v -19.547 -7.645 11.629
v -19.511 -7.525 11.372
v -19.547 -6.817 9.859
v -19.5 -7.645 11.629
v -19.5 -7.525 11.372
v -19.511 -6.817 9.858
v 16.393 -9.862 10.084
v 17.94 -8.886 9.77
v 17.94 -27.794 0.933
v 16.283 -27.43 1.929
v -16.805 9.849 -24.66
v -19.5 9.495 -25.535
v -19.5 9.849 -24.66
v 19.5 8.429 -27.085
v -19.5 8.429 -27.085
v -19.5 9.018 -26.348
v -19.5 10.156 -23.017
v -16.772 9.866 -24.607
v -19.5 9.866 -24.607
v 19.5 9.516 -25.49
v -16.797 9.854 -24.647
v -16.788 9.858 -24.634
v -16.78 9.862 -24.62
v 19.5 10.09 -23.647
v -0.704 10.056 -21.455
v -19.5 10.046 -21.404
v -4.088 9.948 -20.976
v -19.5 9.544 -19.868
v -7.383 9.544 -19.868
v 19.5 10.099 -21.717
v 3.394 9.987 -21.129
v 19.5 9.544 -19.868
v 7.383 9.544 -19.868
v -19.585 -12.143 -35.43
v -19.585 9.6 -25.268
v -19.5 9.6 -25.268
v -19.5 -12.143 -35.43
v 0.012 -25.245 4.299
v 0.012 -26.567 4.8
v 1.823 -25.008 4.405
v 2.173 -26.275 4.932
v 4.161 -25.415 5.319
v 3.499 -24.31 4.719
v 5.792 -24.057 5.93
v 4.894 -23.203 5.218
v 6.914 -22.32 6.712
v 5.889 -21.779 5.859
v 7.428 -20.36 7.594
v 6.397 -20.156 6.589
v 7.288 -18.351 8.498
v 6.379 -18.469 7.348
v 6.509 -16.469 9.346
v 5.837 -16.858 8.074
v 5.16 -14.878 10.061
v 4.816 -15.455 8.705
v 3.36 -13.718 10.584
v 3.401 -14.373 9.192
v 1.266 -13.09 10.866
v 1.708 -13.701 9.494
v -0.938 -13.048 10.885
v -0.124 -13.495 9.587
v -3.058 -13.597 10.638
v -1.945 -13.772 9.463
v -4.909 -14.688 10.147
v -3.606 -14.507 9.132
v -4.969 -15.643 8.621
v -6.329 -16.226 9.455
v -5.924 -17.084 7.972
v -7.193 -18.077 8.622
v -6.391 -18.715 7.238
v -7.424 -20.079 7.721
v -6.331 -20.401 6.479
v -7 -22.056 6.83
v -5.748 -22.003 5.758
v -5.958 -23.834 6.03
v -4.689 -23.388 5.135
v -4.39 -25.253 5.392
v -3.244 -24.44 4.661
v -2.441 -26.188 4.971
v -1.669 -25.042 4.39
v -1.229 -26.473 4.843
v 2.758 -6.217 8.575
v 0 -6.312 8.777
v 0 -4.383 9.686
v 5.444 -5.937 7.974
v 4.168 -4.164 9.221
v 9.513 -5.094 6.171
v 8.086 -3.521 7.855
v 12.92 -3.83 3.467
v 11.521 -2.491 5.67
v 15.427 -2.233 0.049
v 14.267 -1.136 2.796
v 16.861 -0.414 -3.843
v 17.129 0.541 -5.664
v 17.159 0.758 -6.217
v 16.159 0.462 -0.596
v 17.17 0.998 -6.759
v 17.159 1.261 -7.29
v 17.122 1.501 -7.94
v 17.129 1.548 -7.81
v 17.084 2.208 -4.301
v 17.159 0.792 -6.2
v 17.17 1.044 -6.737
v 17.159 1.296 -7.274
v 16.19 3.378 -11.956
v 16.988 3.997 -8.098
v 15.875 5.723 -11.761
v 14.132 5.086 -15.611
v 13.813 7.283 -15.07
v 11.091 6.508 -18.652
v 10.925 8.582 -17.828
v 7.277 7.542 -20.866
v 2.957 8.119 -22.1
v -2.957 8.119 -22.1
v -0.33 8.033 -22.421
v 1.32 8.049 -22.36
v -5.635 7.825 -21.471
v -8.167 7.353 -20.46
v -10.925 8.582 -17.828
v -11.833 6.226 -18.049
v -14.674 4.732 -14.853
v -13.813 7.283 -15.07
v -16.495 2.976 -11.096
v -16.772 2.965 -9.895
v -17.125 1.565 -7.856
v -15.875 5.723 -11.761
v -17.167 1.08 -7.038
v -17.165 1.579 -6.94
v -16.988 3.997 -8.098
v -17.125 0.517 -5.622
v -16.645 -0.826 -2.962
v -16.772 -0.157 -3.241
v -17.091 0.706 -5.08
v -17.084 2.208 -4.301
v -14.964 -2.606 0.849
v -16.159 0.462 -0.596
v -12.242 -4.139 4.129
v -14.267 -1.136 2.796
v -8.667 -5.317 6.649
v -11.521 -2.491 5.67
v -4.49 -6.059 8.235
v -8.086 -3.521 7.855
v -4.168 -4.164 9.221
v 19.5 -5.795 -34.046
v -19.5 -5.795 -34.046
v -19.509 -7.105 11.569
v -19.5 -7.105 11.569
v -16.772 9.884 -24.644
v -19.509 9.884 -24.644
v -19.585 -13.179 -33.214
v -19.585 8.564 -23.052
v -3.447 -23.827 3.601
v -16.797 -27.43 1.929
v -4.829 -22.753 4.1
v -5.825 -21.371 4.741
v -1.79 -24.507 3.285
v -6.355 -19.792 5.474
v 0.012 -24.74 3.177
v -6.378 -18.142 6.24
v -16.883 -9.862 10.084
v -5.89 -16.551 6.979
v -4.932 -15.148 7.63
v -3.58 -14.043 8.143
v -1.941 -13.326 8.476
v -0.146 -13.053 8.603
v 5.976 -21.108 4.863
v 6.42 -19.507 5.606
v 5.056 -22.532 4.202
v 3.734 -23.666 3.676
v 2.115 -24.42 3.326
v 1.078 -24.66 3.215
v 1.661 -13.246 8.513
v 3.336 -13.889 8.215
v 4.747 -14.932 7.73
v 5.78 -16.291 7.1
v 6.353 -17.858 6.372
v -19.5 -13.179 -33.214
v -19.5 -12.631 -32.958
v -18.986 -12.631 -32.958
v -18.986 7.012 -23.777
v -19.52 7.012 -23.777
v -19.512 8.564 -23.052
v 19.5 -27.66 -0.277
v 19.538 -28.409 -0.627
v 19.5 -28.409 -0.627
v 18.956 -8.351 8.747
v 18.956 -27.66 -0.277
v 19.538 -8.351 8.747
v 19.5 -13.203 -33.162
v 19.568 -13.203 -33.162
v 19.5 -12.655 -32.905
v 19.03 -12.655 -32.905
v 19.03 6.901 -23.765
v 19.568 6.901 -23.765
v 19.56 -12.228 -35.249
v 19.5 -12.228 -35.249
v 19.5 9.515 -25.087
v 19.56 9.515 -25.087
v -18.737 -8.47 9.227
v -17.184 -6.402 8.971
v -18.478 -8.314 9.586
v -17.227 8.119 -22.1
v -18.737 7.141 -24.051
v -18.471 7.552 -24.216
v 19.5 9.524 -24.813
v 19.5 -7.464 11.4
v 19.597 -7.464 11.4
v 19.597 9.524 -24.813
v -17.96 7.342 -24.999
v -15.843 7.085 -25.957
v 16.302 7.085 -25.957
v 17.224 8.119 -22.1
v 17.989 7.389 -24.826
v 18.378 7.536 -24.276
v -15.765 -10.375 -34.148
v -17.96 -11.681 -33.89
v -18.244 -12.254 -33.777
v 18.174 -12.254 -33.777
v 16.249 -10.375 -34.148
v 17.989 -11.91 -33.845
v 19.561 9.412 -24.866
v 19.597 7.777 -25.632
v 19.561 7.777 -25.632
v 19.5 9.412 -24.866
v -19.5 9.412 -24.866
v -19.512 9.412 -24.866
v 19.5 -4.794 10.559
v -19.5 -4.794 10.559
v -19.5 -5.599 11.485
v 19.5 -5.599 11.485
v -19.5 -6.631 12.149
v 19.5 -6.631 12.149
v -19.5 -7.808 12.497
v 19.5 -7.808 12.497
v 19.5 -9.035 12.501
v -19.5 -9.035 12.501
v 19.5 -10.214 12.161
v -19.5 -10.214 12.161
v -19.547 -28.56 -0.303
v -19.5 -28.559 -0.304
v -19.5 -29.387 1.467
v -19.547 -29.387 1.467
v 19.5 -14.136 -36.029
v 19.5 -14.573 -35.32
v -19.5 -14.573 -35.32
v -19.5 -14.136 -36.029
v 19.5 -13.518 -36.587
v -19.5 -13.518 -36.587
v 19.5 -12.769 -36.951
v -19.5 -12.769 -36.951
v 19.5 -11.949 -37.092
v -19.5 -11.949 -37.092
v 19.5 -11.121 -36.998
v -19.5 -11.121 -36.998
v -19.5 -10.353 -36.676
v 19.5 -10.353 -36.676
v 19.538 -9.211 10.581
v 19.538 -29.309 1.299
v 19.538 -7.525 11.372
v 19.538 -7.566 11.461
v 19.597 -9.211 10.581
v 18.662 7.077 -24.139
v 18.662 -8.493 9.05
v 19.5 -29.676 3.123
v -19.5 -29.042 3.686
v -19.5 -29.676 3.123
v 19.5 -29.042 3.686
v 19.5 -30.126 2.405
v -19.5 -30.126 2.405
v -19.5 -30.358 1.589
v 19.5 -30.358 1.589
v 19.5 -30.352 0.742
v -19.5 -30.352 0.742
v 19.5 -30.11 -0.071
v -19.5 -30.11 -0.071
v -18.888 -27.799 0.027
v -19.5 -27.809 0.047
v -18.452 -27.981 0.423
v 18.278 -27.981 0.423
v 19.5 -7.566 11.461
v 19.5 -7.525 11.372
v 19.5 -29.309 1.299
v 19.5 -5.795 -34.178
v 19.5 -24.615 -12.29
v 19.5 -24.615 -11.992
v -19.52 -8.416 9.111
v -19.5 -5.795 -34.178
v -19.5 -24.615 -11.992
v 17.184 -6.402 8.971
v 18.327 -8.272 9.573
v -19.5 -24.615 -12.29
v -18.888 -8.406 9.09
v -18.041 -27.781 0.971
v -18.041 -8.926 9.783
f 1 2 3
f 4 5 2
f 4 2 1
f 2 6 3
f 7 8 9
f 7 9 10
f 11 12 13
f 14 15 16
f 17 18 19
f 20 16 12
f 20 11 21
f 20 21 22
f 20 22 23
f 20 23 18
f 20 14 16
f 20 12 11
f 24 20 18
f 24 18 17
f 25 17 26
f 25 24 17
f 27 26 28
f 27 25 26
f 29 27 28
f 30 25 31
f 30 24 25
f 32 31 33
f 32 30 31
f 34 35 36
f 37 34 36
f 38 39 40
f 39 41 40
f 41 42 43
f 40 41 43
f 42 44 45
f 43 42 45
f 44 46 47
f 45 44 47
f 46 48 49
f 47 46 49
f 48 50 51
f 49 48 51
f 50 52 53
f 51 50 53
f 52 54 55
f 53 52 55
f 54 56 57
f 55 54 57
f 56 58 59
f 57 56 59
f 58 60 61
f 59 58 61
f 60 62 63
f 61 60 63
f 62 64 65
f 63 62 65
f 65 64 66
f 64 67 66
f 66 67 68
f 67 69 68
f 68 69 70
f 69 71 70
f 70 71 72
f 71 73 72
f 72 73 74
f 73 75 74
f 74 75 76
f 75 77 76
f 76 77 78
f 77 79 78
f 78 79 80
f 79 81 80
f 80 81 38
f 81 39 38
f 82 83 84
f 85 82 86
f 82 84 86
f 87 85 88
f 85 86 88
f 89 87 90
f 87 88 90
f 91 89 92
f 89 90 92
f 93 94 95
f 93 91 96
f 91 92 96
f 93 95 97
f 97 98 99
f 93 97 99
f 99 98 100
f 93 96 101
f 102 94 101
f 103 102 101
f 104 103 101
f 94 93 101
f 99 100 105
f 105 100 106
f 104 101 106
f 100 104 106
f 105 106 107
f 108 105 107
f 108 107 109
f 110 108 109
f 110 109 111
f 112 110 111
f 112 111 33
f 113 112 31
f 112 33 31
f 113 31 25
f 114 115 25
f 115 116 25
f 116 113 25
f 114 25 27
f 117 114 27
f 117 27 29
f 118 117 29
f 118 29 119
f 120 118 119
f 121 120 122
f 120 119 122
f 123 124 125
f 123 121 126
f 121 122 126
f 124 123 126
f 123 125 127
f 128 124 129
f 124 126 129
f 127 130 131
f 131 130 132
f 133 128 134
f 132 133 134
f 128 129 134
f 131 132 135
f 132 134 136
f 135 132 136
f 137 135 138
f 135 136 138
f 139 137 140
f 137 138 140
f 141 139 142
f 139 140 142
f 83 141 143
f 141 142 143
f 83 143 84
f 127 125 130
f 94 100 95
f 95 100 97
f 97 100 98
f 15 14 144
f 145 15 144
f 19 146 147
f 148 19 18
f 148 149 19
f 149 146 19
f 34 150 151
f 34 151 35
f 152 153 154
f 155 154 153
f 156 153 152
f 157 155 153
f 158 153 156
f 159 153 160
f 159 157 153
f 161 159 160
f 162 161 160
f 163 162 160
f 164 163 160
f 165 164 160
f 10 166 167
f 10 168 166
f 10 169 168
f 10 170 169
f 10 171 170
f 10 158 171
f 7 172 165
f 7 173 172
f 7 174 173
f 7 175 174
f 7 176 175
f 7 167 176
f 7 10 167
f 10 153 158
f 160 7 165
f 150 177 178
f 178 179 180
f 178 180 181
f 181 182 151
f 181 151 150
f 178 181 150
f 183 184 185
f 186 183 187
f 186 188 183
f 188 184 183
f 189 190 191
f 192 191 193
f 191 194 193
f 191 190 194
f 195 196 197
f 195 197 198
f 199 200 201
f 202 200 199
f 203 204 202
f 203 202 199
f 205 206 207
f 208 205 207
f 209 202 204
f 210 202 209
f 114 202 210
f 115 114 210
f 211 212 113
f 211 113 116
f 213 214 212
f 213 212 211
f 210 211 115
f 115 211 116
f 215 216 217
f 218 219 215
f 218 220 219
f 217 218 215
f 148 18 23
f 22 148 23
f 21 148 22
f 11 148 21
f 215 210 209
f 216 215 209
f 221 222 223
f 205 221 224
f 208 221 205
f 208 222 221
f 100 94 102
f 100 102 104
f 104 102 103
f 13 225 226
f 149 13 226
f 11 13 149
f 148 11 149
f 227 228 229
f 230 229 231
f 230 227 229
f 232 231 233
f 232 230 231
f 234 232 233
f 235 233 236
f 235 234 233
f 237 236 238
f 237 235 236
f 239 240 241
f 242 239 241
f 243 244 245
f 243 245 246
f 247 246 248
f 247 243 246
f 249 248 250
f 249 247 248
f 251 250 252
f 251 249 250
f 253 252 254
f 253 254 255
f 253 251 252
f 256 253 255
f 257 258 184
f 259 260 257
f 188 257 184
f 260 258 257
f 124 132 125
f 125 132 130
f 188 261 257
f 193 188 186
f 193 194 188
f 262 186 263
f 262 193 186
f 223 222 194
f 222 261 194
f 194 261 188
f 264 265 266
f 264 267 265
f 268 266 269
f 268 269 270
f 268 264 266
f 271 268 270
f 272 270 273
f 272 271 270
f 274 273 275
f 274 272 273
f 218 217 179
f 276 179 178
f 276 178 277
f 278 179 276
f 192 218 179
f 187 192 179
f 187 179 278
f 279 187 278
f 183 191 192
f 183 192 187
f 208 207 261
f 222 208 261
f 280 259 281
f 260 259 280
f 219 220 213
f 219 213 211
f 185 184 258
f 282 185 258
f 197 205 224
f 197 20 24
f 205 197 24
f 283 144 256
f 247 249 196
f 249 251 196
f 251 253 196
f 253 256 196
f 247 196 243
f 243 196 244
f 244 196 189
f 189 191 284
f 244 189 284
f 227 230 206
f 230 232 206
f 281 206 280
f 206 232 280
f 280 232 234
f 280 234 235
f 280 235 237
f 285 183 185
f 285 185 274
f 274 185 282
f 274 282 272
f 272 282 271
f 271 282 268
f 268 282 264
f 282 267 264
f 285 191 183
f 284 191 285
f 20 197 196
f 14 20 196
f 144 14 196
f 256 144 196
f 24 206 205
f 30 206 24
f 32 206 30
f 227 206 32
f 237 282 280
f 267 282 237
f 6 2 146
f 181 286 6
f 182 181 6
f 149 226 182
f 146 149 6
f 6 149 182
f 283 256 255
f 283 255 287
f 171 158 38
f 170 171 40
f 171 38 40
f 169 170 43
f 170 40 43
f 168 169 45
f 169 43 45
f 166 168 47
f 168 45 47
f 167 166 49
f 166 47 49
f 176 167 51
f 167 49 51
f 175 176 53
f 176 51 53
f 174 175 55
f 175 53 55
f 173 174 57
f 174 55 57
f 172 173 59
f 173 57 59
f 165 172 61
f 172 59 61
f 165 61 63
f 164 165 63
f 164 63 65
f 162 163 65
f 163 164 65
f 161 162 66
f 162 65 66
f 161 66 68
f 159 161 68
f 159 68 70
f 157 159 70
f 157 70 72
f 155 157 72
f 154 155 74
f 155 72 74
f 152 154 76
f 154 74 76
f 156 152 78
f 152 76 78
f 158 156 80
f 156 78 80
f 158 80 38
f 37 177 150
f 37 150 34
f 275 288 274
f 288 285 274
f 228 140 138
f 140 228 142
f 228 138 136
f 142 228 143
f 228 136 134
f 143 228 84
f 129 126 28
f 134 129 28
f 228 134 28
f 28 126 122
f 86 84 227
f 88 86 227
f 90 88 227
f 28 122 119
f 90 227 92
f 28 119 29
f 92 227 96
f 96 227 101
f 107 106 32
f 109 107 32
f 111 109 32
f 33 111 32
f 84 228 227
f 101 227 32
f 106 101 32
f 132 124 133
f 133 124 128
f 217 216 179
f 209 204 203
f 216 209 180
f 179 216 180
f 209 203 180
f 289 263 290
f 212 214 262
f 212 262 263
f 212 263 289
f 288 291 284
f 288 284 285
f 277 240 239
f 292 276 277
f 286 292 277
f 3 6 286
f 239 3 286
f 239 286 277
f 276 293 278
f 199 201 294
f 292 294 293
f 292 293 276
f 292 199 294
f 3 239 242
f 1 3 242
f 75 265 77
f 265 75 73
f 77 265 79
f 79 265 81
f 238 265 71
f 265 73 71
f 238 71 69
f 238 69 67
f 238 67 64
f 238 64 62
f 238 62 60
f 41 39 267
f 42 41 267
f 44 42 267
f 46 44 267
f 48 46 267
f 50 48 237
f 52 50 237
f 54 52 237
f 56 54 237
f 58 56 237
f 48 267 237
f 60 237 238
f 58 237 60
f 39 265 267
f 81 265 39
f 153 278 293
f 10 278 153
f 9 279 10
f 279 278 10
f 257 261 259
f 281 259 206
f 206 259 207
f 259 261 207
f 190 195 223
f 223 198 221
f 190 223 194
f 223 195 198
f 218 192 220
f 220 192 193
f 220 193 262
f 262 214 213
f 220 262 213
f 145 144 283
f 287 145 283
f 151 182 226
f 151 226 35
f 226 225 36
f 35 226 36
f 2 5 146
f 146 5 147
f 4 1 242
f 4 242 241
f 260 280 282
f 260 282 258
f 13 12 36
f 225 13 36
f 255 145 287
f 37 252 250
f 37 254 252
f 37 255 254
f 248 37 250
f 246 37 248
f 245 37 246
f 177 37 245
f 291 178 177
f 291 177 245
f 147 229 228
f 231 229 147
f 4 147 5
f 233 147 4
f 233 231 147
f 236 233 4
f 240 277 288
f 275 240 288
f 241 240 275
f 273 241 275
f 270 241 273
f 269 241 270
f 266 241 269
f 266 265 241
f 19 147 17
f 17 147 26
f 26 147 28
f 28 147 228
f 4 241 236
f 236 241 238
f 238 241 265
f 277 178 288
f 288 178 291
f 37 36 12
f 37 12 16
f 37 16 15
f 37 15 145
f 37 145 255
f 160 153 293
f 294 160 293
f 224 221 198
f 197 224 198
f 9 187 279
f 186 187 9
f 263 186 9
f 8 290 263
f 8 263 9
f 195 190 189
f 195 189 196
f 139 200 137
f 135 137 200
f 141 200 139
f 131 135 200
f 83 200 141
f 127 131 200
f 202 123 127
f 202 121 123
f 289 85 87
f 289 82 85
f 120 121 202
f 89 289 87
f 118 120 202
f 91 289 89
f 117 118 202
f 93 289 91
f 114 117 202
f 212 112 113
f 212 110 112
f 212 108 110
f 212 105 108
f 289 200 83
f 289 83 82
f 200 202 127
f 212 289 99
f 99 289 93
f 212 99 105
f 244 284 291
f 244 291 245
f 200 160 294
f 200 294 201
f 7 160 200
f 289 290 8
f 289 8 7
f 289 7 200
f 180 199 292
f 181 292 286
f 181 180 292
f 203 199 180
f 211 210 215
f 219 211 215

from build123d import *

# Parameters (mm, degrees)
PAD_DEPTH       = 19.5
POCKET_DEPTH    = 42
SKETCH003_R     = 6.4432774511
POCKET001_DEPTH = 5
SKETCH004_R     = 17.169517
POCKET002_DEPTH = 5
PAD001_DEPTH    = 40
PAD002_DEPTH    = 24
CHAMFER_SIZE    = 1


with BuildPart() as part:
    # Sketch → Pad (new body, symmetric)
    with BuildSketch(Plane.YZ):
        with BuildLine():
            Line((-24.615255, -40.645466), (-24.615255, -11.9915260199))
            Line((-24.615255, -11.9915260199), (-30.1099110656, -0.070655828))
            ThreePointArc((-29.0420891926, 3.6862219759), (-30.2710994658, 2.00535199), (-30.1099110656, -0.070655828))
            Line((-29.0420891926, 3.6862219759), (-10.21399901, 12.1607312799))
            ThreePointArc((-4.7944050935, 10.5585189909), (-7.2070537123, 12.364749952), (-10.21399901, 12.1607312799))
            Line((-4.7944050935, 10.5585189909), (9.5435566353, -19.8681705288))
            ThreePointArc((8.4289379194, -27.0849824103), (10.0898273983, -23.6470216852), (9.5435566353, -19.8681705288))
            Line((8.4289379194, -27.0849824103), (-5.794836, -34.045753))
            Line((-5.794836, -34.045753), (-5.794836, -40.645466))
            Line((-5.794836, -40.645466), (-24.615255, -40.645466))
        make_face()
        Polygon((-27.981411, 0.422502), (-27.429825, 1.92854), (-9.861721, 10.084236), (-6.402346, 8.970874), (8.119048, -22.100113), (7.085211, -25.957119), (-10.374684, -34.147896), (-12.253858, -33.776932), align=None, mode=Mode.SUBTRACT)
    extrude(amount=PAD_DEPTH, both=True)

    # Sketch002 (on Face20 of Pad) → Pocket (cut)
    with BuildSketch(Plane.YZ.offset(19.5)):
        with BuildLine():
            Line((-24.841486, -11.770947), (-14.572847112, -35.3198980182))
            ThreePointArc((-14.572847112, -35.3198980182), (-12.7694099446, -36.9511784812), (-10.3532255429, -36.6763794588))
            Line((-10.3532255429, -36.6763794588), (-4.861786, -33.667202))
            Line((-4.861786, -33.667202), (-4.861786, -40.862381))
            Line((-4.861786, -40.862381), (-24.841486, -40.862381))
            Line((-24.841486, -40.862381), (-24.841486, -11.770947))
        make_face()
    extrude(amount=-POCKET_DEPTH, mode=Mode.SUBTRACT)

    # Sketch003 (on Face13 of Pocket) → Pocket001 (cut)
    with BuildSketch(Plane(origin=(0, -6.272118922, 13.9349685583), x_dir=(0, -0.9118876327, -0.4104399412), z_dir=(0, -0.4104399412, 0.9118876327))):
        with Locations((14.81313, 0.011856)):
            Circle(SKETCH003_R)
    extrude(amount=-POCKET001_DEPTH, mode=Mode.SUBTRACT)

    # Sketch004 (on Face11 of Pocket001) → Pocket002 (cut)
    with BuildSketch(Plane(origin=(0, 0.1481790527, 0.06982638), x_dir=(0, -0.426272087, 0.9045949966), z_dir=(0, 0.9045949966, 0.426272087))):
        with Locations((-6.539624, 0)):
            Circle(SKETCH004_R)
    extrude(amount=-POCKET002_DEPTH, mode=Mode.SUBTRACT)

    # Sketch005 (on Face18 of Pocket002) → Pad001 (join)
    with BuildSketch(Plane(origin=(0, 11.2585506109, -23.9993240592), x_dir=(0, -0.9053303403, -0.4247081056), z_dir=(0, -0.4247081056, 0.9053303403))):
        Polygon((1.91594, 19.597263), (3.845239, 19.597263), (3.845239, 18.66189), (1.91594, 17.128572), align=None)
        Polygon((1.518515, -16.771593), (3.74988, -18.737337), (3.74988, -19.519863), (1.518515, -19.509285), align=None)
    extrude(amount=PAD001_DEPTH)

    # Sketch006 (on Face35 of Pad001) → Pad002 (join)
    with BuildSketch(Plane(origin=(0, -1.8135690856, -0.8475930049), x_dir=(0, 0.4234025651, -0.905941647), z_dir=(0, -0.905941647, -0.4234025651))):
        Polygon((-13.586584, 19.537718), (-11.460353, 19.537718), (-11.460353, 18.955914), (-12.613384, 17.940399), (-13.586584, 15.782431), align=None)
        Polygon((24.452187, 19.56831), (24.452187, 19.02969), (25.618814, 17.988846), (26.755948, 15.849336), (26.755948, 19.55965), align=None)
        Polygon((-13.772037, -16.08662), (-12.642, -18.040642), (-11.794474, -18.888168), (-11.818016, -19.547356), (-13.772037, -19.547356), align=None)
        Polygon((26.955989, -14.6143), (25.756637, -17.959862), (24.509941, -18.985624), (24.509941, -19.5853), (26.955989, -19.5853), align=None)
    extrude(amount=PAD002_DEPTH)

    # Chamfer
    chamfer_edges = [part.edges().sort_by_distance(p)[0] for p in [
        (0.011856, -13.904484, 10.499647),
    ]]
    chamfer(chamfer_edges, length=CHAMFER_SIZE)


solid = part.part
